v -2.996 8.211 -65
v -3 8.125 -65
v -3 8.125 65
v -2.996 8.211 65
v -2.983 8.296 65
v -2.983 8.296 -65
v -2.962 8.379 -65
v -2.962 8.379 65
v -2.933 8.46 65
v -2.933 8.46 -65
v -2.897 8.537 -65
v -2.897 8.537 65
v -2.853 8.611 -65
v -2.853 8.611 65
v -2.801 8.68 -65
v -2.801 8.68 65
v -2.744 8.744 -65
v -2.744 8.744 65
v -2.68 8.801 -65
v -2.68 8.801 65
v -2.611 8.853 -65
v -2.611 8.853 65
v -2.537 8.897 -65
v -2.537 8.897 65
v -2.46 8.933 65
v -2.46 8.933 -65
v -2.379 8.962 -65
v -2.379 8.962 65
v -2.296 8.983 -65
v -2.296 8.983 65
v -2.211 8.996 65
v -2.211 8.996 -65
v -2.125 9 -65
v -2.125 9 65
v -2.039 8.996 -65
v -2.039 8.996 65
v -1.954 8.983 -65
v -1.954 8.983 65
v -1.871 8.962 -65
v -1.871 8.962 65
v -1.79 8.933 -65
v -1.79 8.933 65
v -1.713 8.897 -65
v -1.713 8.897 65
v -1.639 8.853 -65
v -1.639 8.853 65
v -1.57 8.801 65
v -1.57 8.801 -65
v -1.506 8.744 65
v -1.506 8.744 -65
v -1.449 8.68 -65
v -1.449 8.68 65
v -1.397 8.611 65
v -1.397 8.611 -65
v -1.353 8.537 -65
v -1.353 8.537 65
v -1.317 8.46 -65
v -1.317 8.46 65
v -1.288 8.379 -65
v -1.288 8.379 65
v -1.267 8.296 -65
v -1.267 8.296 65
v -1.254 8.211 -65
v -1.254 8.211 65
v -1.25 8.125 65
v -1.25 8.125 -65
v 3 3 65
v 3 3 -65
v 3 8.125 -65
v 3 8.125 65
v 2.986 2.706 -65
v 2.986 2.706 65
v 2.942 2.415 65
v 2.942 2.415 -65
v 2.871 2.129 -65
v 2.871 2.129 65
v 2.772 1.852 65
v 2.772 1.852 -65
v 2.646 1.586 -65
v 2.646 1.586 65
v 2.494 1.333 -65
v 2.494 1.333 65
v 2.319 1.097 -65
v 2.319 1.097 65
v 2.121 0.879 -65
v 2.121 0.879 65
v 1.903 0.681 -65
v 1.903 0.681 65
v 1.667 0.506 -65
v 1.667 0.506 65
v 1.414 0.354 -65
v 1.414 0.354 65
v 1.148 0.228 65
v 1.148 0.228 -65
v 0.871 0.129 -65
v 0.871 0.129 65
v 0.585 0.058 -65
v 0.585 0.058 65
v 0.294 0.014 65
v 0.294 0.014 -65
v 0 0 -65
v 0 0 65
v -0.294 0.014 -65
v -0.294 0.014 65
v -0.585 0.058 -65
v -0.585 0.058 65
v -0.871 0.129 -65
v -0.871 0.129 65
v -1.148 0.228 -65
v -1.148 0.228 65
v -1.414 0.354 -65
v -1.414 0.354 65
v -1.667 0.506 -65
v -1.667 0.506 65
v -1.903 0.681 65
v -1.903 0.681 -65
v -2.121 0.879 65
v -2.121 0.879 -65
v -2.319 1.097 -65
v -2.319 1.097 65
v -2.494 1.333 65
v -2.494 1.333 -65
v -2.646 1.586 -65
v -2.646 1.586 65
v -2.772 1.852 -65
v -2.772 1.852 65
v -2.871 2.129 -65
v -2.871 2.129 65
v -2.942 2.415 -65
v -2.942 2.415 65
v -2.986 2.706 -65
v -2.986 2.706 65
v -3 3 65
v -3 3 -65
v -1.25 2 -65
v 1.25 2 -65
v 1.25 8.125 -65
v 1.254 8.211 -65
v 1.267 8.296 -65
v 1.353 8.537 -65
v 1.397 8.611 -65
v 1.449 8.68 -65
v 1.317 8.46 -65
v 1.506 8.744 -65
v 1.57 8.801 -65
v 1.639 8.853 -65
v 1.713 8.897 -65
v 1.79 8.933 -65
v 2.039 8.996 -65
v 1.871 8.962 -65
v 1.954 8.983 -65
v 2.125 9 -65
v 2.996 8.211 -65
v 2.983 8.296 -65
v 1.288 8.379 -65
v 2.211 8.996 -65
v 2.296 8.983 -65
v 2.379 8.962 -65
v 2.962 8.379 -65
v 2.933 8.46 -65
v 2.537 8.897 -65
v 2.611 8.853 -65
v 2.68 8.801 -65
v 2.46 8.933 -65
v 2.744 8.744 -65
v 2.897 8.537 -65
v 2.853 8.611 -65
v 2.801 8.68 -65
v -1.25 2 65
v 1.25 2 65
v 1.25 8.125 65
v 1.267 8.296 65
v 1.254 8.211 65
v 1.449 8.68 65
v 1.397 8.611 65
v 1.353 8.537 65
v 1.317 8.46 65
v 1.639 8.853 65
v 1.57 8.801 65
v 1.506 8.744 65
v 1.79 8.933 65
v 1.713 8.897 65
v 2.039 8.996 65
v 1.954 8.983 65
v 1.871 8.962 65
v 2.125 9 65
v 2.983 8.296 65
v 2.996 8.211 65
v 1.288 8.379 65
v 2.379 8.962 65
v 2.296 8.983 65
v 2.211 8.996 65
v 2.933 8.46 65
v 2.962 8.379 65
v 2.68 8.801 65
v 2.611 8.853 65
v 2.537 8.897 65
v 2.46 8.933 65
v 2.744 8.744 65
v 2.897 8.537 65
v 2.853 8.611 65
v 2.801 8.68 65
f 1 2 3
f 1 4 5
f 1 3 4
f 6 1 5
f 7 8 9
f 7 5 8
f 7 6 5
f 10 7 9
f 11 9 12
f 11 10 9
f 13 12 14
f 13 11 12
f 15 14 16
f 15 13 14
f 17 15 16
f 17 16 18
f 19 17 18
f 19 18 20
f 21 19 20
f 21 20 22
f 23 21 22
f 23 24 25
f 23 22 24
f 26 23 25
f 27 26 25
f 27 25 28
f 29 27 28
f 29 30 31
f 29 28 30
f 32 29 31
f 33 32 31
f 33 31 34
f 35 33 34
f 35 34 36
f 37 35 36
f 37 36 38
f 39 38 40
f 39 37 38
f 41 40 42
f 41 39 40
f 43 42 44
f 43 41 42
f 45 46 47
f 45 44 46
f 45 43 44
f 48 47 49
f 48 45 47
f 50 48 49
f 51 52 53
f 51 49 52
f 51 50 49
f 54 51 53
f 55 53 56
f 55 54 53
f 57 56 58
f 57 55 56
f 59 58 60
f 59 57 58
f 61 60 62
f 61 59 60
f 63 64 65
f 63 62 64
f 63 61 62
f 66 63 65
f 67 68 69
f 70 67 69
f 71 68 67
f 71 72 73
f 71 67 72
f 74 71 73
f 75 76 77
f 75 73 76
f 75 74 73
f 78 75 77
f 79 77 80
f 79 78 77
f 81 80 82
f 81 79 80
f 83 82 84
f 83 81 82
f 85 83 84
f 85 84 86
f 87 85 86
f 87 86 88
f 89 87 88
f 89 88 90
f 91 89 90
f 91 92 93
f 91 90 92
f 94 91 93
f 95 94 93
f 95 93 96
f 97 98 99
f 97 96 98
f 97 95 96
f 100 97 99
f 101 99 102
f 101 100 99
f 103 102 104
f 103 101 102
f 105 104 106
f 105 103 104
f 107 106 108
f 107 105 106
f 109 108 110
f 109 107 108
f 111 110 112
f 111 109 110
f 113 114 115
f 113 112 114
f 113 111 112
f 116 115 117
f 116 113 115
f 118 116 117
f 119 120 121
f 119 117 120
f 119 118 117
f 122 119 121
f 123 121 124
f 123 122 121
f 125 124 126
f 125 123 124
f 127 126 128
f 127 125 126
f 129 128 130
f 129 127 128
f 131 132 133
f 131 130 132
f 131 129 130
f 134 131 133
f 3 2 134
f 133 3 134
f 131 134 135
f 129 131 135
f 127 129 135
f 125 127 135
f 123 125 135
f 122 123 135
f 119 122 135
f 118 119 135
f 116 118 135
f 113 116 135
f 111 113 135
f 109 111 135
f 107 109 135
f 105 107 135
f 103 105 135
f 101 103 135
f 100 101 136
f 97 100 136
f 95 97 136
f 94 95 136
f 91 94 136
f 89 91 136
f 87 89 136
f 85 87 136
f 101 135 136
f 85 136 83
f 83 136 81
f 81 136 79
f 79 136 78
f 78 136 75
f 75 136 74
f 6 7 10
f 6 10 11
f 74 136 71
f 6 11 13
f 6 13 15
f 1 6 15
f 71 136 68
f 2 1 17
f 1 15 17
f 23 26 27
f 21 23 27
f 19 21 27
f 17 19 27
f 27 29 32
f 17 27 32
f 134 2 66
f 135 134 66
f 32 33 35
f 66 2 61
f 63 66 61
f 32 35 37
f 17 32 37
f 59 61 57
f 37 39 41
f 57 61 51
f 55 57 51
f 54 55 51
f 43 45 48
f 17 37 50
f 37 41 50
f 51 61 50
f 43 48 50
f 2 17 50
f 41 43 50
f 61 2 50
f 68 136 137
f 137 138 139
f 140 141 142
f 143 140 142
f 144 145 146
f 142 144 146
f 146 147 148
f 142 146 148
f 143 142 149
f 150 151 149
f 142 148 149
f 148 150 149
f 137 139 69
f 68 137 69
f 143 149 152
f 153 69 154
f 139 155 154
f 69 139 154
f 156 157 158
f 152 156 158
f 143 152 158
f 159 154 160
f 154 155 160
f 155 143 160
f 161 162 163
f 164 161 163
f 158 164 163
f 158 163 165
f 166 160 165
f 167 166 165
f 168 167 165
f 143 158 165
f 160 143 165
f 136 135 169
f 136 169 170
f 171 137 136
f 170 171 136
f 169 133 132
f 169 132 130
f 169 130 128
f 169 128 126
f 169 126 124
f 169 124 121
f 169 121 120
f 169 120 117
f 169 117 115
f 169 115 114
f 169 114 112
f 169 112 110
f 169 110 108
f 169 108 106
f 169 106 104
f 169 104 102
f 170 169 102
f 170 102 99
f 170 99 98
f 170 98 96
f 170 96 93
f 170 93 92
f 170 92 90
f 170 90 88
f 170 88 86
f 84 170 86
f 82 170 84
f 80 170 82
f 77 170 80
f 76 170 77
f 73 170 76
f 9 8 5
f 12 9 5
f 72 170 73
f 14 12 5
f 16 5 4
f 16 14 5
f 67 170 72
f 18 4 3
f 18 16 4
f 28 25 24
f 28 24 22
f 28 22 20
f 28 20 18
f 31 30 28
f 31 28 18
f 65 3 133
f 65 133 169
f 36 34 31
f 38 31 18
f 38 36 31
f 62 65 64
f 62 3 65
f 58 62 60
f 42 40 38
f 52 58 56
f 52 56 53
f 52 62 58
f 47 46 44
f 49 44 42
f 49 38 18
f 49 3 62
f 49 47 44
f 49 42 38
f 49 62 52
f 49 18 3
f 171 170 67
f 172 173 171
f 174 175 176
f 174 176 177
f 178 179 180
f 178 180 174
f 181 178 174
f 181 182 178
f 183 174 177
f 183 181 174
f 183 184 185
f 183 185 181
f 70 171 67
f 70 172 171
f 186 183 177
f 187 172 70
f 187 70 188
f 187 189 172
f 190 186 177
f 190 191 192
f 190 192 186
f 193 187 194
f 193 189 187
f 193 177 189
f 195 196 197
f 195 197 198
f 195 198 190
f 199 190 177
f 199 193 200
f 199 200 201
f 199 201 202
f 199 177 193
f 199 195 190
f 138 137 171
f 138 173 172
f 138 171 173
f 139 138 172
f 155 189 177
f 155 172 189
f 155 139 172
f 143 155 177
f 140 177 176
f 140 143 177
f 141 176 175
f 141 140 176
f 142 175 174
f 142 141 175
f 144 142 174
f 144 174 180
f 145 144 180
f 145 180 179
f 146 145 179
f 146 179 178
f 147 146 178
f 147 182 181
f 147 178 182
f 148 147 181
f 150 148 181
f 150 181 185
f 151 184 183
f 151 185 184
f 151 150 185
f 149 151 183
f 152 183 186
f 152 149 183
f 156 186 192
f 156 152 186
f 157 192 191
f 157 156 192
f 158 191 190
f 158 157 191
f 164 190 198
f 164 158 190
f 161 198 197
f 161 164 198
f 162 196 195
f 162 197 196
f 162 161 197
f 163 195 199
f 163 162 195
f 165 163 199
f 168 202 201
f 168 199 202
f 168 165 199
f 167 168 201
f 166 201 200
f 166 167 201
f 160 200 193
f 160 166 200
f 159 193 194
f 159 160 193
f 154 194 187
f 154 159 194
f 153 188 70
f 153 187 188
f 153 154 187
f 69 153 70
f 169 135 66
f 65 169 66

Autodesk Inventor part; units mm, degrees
ref_plane "YZ Plane" through (0, 0, 0) normal (1, 0, 0) x (0, 1, 0)
ref_plane "XZ Plane" through (0, 0, 0) normal (0, 1, 0) x (-1, 0, 0)
ref_plane "XY Plane" through (0, 0, 0) normal (0, 0, 1) x (1, 0, 0)
sketch "草圖1" plane through (0, 0, 0) normal (0, 0, 1) x (1, 0, 0)
  line L0 (0, 0) -> (-19.4073, 0) construction
  line L1 (0, 0) -> (0, 21.4127) construction
  line L2 (-3, 8.125) -> (-3, 3)
  arc A0 (-3, 3) -> (3, 3) centre (0, 3) ccw
  line L3 (3, 3) -> (3, 8.125)
  line L4 (1.25, 8.125) -> (1.25, 2)
  line L5 (-1.25, 2) -> (-1.25, 8.125)
  line L6 (-3, 9.712) -> (-3, 6.8385) construction
  line L7 (3, 9.712) -> (3, 6.8385) construction
  line L8 (-4.0339, 9) -> (4.2037, 9) construction
  line L9 (-1.25, 2) -> (1.25, 2)
  arc A1 (-1.25, 8.125) -> (-3, 8.125) centre (-2.125, 8.125) ccw
  arc A2 (3, 8.125) -> (1.25, 8.125) centre (2.125, 8.125) ccw
  dimension "d0" = 6
  dimension "d2" = 9
  dimension "d3" = 2
  dimension "d4" = 2.5
  dimension "d6" = 6
extrude "擠出1" add sketch "草圖1" along normal mid plane 130
properties part number "0 零件" material "橡膠"
